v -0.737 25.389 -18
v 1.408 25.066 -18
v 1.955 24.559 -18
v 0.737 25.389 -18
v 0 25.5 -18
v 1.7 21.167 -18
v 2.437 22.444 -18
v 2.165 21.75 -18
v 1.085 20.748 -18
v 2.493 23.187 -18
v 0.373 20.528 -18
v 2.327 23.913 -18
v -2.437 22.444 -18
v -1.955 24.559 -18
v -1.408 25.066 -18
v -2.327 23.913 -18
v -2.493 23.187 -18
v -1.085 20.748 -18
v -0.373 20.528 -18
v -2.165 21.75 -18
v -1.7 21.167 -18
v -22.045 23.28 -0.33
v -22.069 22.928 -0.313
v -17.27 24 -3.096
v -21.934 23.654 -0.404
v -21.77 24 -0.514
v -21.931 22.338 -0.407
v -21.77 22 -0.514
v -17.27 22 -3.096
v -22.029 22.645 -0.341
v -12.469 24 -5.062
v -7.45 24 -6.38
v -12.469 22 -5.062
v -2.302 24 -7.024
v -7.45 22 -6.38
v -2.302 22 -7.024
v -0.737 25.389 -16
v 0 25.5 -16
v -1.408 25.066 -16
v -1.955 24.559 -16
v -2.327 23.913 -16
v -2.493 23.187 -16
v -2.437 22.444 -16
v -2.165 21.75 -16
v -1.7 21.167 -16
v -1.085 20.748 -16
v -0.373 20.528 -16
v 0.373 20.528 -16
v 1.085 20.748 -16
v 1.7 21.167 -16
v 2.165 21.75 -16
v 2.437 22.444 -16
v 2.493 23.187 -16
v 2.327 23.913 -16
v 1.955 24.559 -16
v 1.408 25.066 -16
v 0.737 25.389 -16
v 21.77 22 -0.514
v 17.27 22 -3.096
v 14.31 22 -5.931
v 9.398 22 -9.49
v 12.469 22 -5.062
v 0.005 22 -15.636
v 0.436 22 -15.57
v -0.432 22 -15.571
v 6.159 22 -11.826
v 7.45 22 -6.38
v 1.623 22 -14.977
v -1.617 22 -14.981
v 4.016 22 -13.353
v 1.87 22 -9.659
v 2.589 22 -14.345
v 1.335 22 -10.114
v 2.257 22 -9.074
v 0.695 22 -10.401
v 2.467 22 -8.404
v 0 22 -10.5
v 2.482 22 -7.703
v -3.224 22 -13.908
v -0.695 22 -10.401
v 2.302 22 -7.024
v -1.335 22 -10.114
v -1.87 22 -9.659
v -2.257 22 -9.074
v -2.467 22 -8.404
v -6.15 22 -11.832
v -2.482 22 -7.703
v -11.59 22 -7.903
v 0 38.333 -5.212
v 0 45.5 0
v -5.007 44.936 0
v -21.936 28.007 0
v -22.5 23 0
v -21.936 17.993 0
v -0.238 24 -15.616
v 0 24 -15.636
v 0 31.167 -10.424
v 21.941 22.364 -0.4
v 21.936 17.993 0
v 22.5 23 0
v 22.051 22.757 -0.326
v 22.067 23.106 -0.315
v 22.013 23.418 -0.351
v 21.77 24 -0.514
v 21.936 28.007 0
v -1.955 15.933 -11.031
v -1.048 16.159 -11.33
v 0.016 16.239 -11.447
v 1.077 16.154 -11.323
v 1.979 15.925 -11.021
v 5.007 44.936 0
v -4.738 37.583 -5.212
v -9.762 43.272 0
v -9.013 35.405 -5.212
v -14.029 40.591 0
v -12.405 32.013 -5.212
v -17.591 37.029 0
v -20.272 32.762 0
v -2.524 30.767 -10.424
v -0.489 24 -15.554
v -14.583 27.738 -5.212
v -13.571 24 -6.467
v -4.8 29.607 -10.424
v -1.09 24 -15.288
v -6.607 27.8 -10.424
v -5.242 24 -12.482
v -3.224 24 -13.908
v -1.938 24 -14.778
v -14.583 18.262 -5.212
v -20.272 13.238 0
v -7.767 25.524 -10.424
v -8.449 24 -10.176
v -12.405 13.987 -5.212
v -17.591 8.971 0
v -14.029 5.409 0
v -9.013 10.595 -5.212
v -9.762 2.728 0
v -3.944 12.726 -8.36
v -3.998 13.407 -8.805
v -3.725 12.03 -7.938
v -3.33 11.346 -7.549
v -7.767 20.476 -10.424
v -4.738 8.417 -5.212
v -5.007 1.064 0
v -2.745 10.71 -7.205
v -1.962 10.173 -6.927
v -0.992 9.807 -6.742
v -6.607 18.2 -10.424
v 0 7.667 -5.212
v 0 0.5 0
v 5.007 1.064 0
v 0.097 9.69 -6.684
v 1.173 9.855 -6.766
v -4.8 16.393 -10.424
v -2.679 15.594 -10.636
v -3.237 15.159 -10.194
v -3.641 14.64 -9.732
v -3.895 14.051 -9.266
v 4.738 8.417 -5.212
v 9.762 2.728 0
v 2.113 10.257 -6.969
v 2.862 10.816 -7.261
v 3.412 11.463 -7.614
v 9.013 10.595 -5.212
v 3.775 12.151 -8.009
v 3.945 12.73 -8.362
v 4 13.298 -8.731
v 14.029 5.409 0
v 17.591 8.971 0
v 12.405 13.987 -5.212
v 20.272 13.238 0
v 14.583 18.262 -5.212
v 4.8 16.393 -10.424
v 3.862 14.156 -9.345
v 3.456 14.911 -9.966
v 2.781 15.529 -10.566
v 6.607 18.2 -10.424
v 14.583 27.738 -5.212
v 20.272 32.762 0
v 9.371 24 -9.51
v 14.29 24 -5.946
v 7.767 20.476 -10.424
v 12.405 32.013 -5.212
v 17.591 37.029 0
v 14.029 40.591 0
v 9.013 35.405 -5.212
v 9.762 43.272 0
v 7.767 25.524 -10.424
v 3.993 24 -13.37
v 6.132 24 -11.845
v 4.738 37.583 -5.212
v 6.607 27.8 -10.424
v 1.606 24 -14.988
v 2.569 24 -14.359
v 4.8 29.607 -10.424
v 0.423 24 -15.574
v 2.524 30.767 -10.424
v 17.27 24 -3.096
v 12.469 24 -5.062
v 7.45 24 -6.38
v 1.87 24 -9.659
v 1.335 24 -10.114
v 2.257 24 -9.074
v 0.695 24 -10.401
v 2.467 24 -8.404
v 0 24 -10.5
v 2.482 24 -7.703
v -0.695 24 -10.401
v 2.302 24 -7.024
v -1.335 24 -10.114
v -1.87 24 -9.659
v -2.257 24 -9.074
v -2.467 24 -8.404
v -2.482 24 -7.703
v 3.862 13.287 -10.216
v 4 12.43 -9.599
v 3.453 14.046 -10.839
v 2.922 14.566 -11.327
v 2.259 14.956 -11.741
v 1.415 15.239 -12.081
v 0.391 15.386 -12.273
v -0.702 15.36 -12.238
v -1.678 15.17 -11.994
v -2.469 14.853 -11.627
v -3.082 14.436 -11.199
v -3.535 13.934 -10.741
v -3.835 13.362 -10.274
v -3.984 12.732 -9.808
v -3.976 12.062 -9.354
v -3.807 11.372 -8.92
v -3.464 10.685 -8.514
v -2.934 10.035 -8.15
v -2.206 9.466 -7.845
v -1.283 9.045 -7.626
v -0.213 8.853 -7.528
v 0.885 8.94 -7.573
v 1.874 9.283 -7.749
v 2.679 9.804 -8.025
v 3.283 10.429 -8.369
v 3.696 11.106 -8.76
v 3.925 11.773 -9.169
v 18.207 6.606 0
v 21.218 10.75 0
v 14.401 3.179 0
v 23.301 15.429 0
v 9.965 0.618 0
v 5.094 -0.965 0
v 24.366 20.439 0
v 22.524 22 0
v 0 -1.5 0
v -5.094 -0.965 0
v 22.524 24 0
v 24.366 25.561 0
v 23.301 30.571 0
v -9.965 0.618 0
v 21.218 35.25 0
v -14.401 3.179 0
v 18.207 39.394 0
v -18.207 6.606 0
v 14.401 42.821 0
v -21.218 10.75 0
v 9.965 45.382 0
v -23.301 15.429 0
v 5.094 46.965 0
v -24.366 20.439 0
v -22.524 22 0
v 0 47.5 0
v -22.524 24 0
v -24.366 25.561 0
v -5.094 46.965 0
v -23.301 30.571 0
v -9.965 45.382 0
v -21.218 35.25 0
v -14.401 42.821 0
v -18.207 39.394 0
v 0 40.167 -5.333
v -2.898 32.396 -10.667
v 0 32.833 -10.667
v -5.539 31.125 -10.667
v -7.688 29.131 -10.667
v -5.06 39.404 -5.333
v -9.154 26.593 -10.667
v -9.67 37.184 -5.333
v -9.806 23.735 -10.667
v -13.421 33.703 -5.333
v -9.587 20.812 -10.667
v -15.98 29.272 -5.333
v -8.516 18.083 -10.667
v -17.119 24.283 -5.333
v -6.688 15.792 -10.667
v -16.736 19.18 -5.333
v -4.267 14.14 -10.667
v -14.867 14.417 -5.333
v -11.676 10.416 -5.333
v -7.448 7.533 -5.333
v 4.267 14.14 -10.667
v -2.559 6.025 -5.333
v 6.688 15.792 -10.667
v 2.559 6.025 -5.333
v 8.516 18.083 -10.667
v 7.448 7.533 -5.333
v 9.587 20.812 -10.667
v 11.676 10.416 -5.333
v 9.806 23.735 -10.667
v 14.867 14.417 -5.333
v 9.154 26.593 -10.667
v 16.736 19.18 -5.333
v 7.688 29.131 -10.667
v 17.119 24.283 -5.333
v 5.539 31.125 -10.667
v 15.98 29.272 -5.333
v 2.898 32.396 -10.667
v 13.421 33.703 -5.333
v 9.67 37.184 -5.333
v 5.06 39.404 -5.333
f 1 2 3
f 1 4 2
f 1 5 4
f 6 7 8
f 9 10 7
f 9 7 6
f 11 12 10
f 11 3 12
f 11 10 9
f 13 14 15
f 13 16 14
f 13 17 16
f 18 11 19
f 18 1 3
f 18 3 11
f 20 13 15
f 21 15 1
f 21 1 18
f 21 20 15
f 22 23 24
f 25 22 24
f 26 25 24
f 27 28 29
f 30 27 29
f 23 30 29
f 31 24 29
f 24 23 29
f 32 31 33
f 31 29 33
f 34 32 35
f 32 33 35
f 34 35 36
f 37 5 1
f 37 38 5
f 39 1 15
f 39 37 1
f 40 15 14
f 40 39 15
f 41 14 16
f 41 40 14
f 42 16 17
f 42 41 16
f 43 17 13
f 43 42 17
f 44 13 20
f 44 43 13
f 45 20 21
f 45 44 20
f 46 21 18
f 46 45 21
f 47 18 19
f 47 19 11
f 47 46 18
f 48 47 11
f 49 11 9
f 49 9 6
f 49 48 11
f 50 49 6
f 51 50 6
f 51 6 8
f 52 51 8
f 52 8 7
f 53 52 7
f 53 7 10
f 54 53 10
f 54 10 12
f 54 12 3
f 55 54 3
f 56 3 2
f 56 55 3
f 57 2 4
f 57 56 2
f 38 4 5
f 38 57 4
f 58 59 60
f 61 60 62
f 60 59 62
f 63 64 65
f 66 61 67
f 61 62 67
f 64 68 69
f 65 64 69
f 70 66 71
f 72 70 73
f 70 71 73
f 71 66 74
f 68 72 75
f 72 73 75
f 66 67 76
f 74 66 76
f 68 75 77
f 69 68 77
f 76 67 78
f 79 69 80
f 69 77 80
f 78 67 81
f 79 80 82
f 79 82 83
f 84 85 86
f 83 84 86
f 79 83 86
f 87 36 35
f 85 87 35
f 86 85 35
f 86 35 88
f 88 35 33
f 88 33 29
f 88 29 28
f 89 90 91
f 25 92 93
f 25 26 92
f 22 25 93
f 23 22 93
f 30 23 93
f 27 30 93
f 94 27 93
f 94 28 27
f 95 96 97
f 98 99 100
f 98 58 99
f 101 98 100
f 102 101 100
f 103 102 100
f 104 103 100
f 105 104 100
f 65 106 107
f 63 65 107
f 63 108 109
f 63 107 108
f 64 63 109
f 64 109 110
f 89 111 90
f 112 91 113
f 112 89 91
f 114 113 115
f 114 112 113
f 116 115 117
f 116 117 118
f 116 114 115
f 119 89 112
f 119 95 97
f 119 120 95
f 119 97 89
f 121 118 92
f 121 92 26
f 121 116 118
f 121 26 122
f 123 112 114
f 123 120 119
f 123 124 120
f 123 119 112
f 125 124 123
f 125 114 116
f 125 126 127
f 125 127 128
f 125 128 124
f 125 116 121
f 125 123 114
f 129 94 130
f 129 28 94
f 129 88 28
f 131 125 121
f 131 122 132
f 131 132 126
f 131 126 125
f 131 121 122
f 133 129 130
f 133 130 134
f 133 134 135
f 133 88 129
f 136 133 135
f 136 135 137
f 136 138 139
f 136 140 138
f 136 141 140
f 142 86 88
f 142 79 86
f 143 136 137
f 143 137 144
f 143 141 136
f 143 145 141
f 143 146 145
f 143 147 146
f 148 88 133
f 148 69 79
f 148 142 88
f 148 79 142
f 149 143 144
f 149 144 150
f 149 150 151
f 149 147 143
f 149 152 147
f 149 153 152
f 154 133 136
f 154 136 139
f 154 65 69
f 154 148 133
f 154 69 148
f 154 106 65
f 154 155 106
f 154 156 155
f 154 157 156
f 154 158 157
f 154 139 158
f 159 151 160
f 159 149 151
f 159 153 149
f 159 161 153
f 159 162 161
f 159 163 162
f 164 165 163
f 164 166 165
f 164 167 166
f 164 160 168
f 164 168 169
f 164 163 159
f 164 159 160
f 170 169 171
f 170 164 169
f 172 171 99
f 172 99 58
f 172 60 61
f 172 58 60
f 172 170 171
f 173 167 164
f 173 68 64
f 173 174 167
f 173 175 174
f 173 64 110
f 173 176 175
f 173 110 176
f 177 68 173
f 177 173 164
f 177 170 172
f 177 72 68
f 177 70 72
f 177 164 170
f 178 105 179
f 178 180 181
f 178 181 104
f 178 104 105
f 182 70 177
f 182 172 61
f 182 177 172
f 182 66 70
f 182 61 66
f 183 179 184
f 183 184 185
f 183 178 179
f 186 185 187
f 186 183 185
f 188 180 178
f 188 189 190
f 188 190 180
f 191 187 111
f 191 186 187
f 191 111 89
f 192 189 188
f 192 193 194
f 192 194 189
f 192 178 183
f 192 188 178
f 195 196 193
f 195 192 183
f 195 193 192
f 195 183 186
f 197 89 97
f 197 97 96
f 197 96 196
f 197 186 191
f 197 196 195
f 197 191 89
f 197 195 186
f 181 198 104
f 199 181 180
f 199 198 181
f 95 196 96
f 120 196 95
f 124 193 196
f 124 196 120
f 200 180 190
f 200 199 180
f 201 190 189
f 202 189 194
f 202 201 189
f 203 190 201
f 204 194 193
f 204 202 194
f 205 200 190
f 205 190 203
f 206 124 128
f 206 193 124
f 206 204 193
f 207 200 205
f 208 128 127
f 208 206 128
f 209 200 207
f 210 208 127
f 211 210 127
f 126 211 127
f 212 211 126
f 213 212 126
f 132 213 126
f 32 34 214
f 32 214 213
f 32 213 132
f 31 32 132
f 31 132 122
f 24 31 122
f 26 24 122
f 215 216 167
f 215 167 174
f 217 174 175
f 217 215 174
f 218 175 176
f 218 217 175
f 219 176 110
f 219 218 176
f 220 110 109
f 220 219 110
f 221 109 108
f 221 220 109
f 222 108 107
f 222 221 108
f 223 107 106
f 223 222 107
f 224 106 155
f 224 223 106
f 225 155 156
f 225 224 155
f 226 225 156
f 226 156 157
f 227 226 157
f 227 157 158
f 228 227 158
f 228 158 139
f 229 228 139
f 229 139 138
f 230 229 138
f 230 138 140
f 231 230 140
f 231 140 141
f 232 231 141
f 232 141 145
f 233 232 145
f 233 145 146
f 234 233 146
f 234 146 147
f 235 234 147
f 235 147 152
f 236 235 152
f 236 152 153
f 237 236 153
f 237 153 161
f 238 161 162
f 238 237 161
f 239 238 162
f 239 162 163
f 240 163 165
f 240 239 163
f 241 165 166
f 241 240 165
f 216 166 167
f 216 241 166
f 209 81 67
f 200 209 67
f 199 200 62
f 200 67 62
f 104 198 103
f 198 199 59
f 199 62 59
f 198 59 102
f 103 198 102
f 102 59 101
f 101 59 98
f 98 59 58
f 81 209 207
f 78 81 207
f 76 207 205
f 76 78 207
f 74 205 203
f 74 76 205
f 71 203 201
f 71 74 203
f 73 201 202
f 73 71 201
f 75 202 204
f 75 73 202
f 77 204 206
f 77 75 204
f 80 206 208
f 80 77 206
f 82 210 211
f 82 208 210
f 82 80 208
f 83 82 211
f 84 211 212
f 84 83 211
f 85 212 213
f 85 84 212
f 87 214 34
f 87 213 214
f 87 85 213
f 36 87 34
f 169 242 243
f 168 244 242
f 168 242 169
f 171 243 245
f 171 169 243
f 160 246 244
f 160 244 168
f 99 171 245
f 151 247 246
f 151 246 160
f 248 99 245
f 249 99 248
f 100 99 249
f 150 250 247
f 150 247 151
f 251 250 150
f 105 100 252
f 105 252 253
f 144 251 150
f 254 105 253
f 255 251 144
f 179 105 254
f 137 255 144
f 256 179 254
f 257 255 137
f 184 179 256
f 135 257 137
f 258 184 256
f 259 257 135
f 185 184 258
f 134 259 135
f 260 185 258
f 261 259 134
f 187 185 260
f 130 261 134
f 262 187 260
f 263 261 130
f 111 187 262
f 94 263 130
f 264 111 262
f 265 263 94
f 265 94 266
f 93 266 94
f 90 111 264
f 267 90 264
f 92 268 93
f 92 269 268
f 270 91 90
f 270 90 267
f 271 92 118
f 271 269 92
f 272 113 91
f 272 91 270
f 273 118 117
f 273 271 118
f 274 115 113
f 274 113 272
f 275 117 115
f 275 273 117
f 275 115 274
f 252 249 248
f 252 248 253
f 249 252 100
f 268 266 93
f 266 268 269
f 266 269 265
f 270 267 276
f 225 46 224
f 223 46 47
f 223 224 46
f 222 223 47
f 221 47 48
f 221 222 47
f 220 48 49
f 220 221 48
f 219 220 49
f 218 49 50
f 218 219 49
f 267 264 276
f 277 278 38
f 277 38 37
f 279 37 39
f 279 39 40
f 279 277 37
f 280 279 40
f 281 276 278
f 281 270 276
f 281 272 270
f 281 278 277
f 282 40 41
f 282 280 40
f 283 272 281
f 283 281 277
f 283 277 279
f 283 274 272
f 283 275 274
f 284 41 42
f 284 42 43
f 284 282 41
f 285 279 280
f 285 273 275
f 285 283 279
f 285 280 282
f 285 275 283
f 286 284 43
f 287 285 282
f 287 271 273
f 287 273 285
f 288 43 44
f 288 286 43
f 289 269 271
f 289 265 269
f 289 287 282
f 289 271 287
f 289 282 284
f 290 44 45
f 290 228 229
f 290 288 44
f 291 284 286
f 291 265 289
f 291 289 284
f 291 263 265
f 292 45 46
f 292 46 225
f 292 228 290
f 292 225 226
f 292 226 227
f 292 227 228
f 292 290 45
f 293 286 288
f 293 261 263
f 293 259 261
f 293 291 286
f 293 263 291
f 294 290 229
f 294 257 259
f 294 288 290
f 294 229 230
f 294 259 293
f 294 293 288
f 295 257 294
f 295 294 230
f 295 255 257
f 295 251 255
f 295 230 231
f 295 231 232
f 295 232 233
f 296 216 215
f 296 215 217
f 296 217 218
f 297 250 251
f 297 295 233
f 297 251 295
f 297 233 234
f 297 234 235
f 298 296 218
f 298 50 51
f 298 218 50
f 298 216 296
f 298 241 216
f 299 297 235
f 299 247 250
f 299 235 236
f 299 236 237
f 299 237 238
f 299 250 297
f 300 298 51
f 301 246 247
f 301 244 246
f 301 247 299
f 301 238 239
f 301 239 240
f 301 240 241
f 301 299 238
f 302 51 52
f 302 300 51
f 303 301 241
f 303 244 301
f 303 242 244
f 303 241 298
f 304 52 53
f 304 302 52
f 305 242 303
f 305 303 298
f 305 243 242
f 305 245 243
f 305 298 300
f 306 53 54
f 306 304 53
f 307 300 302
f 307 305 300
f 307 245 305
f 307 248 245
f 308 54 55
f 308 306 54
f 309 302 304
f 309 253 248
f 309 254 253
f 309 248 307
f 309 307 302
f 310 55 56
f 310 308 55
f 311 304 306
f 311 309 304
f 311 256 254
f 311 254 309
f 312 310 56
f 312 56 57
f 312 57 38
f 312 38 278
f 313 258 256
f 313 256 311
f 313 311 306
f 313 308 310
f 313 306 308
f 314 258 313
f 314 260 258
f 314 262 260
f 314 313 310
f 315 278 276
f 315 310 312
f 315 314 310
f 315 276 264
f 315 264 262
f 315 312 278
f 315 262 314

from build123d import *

# Parameters (mm, degrees)
CYLINDER001_R               = 4
CYLINDER001_DEPTH           = 10
CYLINDER001_PLACEMENT_ANGLE = 45
CYLINDER_R                  = 2.5
CYLINDER_DEPTH              = 10
PAD006_DEPTH                = 1


with BuildPart() as cylinder001:
    # Cylinder001 → Cylinder001 (new body)
    with BuildSketch(Plane.XY):
        Circle(CYLINDER001_R)
    extrude(amount=CYLINDER001_DEPTH)


with BuildPart() as cylinder001_1:
    # Cylinder001 placement: moved
    add(cylinder001.part.moved(Location((0, -13.435029, 5.535534))).rotate(Axis((0, -13.435029, 5.535534), (-1, 0, 0)), CYLINDER001_PLACEMENT_ANGLE))


with BuildPart() as cylinder:
    # Cylinder → Cylinder (new body)
    with BuildSketch(Plane(origin=(0, -6, 10), x_dir=(0, 0, 1), z_dir=(0, 1, 0))):
        Circle(CYLINDER_R)
    extrude(amount=CYLINDER_DEPTH)


with BuildPart() as asad:
    # Sketch009 → Pad006 (new body, symmetric)
    with BuildSketch(Plane.XZ):
        with BuildLine():
            Line((22.524081, 18), (0.5, 2))
            Line((0.5, 2), (0, 2))
            Line((-0.5, 2), (0, 2))
            Line((-22.524081, 18), (-0.5, 2))
            ThreePointArc((-22.524081, 18), (0, 10.908086), (22.524081, 18))
        make_face()
    extrude(amount=PAD006_DEPTH, both=True)

    # Cut002: cut Cylinder
    add(cylinder.part, mode=Mode.SUBTRACT)


with BuildPart() as ledsupportb:
    # Sketch008 → Revolution001 (revolve)
    with BuildSketch(Plane.YZ):
        Polygon((0, 2), (0, 0), (2.5, 0), (2.5, 2), (24.5, 18), (22.5, 18), (0.5, 2), align=None)
    revolve(axis=Axis((0, 0, 0), (0, 0, 1)))

    # Fusion002: union asad
    add(asad.part)

    # Cut003: cut Cylinder001
    add(cylinder001_1.part, mode=Mode.SUBTRACT)


with BuildPart() as ledsupportb_1:
    # Cut003 placement: moved
    add(ledsupportb.part.moved(Location((0, -27, -18))))


with BuildPart() as ledsupportb_2:
    # Body009 placement: moved
    add(ledsupportb_1.part.moved(Location((0, 50, 0))))


solid = ledsupportb_2.part
